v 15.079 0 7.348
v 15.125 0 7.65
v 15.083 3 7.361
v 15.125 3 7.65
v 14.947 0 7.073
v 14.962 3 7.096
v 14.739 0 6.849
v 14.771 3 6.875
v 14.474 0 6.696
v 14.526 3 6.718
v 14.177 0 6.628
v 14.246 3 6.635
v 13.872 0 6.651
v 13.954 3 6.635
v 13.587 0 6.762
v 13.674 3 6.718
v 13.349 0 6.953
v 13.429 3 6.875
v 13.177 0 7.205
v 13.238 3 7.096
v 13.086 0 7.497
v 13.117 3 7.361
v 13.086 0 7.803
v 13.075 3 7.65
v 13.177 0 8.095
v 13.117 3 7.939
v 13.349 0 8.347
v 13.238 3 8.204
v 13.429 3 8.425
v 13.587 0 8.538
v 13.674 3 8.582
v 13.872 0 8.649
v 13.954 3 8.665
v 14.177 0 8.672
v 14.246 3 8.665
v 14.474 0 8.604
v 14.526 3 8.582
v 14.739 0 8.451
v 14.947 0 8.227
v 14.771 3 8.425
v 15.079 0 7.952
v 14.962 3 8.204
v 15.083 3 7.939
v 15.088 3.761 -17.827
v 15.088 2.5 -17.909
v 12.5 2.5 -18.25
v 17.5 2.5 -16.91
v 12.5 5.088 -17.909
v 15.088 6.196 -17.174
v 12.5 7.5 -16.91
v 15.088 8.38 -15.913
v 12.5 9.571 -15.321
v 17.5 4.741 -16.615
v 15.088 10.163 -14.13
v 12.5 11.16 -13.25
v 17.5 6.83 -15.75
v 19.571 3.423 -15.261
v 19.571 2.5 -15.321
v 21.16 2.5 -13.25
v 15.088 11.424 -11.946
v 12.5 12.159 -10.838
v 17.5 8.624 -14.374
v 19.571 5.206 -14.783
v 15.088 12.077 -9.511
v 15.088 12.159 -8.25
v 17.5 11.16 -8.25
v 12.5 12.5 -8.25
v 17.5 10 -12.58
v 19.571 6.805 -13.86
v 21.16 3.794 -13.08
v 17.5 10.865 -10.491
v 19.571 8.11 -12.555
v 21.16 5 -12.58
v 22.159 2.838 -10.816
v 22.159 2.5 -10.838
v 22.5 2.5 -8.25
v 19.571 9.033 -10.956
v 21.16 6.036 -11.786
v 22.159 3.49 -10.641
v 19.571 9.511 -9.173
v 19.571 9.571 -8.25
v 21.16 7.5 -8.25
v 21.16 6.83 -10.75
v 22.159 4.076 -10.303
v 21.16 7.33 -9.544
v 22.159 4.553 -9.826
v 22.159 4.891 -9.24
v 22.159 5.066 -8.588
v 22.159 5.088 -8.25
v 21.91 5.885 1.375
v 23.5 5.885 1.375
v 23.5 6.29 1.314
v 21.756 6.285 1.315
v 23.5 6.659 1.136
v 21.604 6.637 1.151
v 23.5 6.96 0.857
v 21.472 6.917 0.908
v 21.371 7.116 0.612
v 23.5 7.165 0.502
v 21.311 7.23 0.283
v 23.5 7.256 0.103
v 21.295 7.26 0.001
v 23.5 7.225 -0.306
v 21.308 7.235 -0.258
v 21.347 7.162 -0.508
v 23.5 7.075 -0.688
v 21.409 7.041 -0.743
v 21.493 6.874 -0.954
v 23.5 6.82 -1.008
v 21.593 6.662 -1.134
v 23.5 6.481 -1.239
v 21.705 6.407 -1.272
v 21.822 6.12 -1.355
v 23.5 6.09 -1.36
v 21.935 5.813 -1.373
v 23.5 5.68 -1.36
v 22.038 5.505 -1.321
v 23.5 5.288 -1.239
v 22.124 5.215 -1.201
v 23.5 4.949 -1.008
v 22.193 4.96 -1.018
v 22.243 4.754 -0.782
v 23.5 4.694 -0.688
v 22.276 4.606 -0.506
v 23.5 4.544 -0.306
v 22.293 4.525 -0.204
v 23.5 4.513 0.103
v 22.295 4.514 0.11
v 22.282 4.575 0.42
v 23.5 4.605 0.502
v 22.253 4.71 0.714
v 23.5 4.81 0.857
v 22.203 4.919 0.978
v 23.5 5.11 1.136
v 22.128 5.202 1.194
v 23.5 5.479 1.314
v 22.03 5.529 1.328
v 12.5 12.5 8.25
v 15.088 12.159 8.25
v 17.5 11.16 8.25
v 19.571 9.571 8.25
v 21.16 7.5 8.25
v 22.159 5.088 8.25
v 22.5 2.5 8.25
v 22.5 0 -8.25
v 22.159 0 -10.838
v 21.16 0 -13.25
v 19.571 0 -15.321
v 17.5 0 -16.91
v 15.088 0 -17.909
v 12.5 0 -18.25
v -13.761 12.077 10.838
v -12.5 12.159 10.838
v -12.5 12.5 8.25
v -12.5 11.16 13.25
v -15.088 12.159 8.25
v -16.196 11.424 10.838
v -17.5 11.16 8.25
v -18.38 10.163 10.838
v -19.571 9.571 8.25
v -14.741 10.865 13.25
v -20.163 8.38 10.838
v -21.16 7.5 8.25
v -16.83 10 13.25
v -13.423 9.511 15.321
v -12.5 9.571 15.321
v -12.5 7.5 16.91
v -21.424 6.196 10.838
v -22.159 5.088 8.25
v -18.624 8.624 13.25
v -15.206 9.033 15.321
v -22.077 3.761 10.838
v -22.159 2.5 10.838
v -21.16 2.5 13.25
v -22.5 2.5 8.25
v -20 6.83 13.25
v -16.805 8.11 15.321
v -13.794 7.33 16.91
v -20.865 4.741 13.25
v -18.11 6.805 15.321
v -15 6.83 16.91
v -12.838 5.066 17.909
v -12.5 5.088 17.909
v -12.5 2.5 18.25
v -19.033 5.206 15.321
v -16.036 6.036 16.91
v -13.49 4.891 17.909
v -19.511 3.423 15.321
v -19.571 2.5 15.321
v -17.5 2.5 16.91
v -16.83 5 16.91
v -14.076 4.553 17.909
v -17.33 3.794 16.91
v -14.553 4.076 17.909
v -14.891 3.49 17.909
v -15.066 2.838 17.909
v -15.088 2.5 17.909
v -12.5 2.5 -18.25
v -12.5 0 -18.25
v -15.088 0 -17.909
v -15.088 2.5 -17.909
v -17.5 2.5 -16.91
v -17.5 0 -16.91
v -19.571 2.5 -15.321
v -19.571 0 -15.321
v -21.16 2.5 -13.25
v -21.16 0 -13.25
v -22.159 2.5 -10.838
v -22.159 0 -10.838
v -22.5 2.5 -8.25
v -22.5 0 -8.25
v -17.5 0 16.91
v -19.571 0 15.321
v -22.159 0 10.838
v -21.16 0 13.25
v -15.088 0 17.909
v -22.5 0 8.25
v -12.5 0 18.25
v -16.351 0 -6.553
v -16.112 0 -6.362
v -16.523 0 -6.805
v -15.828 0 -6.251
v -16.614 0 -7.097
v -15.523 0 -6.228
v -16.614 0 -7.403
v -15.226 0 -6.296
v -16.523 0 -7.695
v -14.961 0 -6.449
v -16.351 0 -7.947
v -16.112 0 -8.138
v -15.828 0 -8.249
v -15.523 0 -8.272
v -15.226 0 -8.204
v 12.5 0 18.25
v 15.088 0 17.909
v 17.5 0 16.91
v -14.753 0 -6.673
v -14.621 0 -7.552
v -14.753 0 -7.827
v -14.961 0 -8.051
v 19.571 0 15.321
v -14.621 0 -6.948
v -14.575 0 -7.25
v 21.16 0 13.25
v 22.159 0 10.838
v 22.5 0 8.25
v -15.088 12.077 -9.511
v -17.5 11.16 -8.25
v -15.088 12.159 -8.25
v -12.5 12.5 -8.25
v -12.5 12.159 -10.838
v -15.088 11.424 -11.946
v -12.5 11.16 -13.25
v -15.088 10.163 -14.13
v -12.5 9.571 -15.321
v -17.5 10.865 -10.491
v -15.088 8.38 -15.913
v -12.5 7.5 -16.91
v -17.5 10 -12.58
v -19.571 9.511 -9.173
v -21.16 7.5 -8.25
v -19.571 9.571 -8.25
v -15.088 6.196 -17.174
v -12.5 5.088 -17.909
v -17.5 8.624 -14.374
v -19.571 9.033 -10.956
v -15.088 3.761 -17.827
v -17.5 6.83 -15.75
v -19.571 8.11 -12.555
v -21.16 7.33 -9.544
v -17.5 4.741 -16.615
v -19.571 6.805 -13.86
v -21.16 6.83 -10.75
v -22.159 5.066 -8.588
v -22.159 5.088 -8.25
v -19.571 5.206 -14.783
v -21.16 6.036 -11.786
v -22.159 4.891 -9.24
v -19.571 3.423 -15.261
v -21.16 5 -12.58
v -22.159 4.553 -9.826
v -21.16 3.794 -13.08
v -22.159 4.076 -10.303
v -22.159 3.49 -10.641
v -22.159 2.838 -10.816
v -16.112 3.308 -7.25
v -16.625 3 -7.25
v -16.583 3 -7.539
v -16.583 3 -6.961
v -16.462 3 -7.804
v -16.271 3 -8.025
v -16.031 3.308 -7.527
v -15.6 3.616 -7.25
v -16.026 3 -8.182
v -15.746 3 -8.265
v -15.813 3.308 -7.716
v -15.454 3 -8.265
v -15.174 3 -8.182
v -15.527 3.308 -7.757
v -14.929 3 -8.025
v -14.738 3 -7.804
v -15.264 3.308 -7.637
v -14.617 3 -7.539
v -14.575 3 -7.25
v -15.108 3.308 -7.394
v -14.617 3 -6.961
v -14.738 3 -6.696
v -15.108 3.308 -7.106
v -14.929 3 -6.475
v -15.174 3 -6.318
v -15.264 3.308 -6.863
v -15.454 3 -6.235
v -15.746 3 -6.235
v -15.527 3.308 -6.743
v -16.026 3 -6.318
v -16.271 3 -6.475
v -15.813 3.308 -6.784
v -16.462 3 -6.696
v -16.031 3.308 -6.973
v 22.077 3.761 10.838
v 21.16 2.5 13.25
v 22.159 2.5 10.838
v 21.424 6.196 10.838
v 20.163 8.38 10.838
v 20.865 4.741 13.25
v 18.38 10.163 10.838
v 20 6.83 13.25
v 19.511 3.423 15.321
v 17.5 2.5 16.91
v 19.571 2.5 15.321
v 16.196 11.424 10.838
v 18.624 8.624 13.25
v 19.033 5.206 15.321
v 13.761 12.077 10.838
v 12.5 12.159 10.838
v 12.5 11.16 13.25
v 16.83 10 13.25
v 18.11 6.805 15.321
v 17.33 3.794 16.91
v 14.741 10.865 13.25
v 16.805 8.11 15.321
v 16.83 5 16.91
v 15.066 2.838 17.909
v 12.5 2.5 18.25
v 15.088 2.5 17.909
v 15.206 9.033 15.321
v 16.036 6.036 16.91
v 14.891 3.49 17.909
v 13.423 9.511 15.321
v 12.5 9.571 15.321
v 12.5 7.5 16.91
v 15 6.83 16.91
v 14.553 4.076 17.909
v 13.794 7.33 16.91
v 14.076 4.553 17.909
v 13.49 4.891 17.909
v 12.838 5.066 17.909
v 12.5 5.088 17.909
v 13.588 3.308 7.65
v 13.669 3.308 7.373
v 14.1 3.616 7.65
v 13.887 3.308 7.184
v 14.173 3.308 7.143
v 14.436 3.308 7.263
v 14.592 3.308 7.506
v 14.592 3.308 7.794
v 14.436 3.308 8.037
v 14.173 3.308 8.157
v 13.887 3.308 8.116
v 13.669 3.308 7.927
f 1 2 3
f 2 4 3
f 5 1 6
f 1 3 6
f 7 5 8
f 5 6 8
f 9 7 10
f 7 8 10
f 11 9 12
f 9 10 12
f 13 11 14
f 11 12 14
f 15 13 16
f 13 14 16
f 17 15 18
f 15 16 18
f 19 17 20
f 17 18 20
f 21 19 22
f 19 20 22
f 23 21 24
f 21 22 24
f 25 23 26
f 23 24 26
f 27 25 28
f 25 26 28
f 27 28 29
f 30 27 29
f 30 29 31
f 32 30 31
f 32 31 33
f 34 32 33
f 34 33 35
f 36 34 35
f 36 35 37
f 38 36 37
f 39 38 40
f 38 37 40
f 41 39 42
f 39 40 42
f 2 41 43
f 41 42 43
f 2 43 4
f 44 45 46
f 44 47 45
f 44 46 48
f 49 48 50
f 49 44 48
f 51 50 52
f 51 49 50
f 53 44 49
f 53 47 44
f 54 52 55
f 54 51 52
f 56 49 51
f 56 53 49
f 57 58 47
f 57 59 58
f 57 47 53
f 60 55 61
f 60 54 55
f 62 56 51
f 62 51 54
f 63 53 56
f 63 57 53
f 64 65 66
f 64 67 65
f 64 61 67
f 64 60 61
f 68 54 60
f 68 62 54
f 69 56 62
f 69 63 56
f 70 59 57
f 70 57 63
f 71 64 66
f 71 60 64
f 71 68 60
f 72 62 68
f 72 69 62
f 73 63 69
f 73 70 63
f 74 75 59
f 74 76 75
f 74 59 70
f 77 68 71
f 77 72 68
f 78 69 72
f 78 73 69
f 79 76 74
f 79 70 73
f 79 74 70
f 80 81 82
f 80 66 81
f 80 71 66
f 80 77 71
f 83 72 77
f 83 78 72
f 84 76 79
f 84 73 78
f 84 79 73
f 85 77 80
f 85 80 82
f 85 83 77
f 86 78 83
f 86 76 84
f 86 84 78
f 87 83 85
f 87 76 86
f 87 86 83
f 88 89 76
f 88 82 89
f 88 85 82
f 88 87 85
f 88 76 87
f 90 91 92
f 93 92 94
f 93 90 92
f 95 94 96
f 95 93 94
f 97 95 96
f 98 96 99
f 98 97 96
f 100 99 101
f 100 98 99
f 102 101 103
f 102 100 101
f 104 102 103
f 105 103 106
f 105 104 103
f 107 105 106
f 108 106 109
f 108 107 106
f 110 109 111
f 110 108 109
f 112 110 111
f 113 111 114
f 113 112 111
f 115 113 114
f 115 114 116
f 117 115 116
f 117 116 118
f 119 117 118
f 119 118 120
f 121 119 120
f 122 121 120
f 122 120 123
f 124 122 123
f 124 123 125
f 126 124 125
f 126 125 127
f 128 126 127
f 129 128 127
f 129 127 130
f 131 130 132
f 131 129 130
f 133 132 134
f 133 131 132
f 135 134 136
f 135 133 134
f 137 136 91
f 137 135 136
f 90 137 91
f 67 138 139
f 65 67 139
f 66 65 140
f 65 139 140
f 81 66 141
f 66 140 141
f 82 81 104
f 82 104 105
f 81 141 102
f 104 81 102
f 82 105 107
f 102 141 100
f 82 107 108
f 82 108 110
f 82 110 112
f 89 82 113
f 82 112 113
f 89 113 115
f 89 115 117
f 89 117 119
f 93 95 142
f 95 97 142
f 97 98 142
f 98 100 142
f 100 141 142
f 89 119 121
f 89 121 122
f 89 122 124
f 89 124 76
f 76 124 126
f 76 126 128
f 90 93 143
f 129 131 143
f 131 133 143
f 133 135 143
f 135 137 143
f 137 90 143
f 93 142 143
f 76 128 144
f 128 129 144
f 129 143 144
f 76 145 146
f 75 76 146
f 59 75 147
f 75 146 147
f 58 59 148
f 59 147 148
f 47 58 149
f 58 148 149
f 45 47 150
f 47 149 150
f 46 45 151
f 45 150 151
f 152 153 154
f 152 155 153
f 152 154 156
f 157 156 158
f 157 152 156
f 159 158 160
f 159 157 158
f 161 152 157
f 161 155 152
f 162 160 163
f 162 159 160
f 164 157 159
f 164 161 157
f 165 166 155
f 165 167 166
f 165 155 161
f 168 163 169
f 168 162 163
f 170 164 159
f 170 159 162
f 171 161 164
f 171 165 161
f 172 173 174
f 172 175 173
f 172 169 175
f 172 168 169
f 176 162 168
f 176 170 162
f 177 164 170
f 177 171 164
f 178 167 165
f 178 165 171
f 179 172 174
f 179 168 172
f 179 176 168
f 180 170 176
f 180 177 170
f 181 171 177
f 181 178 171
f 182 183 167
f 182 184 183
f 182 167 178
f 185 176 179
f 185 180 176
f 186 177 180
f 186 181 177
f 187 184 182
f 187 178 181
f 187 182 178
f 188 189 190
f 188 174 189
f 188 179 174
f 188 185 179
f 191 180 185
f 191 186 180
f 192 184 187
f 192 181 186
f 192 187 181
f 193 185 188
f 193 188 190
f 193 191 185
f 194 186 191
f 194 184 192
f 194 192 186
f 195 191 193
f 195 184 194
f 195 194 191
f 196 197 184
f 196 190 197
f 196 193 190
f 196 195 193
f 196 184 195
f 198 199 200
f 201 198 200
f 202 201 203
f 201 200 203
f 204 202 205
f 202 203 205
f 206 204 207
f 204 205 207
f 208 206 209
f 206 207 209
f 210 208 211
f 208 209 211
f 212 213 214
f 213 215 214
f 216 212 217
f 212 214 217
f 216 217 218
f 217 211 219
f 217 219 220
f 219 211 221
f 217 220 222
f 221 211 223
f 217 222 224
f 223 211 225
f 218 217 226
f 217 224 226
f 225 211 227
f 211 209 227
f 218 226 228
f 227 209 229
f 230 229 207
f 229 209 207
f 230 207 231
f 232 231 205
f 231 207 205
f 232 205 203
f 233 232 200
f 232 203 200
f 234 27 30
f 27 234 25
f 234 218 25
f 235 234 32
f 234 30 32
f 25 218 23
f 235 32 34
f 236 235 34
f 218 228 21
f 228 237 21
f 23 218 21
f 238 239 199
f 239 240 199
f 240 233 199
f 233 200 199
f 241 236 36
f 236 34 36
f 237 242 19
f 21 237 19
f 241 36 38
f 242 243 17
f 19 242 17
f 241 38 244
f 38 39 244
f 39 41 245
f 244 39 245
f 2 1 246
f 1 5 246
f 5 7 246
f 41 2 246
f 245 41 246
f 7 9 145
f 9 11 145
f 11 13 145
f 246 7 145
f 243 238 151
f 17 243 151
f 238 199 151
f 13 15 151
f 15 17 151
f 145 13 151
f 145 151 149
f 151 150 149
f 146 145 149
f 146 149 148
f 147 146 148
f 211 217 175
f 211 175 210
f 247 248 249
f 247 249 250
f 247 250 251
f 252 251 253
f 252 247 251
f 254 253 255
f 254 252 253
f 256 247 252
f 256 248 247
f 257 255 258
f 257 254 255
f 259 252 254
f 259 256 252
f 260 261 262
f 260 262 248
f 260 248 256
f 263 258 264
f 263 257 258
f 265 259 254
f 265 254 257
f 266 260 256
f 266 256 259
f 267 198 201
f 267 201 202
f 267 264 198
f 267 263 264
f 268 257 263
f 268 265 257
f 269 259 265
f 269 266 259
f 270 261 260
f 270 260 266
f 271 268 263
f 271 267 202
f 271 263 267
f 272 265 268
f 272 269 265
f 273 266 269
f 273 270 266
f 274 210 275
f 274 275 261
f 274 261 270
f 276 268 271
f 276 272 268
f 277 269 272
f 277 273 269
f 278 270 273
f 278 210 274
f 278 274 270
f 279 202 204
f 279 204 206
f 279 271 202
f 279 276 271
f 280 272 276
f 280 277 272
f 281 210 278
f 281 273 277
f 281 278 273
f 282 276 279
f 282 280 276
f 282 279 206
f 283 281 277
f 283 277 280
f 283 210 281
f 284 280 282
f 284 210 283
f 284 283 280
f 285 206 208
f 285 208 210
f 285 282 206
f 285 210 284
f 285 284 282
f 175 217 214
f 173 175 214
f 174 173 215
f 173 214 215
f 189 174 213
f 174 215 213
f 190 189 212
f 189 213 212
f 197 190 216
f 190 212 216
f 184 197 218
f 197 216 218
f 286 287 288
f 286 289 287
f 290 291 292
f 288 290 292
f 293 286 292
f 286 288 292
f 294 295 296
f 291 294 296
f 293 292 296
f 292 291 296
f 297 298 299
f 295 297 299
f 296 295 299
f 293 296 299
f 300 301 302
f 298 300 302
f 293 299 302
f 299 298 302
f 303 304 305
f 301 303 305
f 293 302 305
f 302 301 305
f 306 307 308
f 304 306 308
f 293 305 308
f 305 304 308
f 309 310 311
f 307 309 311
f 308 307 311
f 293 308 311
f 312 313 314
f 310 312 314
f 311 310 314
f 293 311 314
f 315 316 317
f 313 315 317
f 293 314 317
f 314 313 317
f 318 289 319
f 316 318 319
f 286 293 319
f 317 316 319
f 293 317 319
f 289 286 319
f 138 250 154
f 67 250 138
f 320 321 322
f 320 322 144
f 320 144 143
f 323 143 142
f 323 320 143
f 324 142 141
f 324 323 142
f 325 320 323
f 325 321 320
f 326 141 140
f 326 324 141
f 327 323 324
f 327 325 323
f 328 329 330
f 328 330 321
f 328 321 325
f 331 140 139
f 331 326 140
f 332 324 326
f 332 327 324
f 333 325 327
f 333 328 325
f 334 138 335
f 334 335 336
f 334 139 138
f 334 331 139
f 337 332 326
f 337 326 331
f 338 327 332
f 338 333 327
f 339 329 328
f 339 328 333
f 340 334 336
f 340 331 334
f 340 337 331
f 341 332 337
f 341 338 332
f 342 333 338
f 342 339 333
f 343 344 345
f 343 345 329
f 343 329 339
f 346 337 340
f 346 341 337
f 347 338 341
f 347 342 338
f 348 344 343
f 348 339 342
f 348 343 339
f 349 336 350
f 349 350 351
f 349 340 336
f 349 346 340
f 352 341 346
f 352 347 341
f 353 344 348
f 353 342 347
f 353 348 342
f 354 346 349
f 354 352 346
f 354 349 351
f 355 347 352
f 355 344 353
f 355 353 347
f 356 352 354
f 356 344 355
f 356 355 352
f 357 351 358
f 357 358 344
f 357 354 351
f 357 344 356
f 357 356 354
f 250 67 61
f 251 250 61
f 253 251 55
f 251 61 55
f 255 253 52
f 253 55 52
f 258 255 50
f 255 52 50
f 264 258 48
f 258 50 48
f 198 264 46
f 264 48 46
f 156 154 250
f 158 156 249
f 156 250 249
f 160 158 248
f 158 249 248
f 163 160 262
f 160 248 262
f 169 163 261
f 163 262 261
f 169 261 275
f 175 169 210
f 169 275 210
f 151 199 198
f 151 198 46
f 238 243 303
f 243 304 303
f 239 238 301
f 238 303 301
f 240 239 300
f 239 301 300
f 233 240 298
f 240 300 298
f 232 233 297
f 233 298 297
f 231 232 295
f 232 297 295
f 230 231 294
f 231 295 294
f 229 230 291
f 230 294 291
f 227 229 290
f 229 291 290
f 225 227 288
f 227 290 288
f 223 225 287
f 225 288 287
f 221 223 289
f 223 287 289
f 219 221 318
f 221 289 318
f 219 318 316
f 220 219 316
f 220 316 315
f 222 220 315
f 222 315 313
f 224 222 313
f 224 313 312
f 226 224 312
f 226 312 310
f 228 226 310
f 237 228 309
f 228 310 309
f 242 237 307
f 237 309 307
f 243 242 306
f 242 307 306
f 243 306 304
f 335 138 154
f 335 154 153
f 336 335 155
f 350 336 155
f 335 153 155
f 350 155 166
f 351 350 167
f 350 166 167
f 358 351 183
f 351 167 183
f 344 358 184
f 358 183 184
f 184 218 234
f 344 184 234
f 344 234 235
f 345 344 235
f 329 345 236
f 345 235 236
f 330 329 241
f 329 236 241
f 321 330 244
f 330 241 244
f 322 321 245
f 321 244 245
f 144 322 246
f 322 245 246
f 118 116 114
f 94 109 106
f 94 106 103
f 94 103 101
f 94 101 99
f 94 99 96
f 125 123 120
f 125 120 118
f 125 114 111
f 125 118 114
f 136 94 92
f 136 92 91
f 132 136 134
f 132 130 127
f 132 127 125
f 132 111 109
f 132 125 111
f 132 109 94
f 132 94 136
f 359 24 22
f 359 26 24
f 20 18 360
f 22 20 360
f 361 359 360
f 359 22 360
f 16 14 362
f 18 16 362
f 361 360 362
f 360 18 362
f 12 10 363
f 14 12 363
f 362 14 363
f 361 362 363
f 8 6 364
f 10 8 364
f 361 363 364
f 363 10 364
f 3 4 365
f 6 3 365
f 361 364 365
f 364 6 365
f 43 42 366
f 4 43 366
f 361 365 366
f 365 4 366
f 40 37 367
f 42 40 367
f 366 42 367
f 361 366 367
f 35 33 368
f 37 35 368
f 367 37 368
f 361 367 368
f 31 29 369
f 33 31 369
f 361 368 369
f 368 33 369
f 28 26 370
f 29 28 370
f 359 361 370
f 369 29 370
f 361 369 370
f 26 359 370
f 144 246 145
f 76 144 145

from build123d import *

# Parameters (mm, degrees)
SKETCH1_W                          = 45
SKETCH1_H                          = 36.5
BOSS_EXTRUDE1_DEPTH                = 12.5
SKETCH2_R                          = 1.375
BOSS_EXTRUDE2_DEPTH                = 1
TAP_DRILL_FOR_M2_5X0_45_TAP1_D     = 2.05
TAP_DRILL_FOR_M2_5X0_45_TAP1_DEPTH = 3
TAP_DRILL_FOR_M2_5X0_45_TAP1_TIP   = 0.615882135
FILLET1_R                          = 10


with BuildPart() as part:
    # Sketch1 → Boss-Extrude1 (new body)
    with BuildSketch(Plane(origin=(0, 0, 0), x_dir=(1, 0, 0), z_dir=(0, 1, 0))):
        Rectangle(SKETCH1_W, SKETCH1_H)
    extrude(amount=BOSS_EXTRUDE1_DEPTH)

    # Sketch2 → Boss-Extrude2 (add)
    with BuildSketch(Plane(origin=(22.5, 0, 0), x_dir=(0, 0, -1), z_dir=(1, 0, 0))):
        with Locations(Location((0, 5.884601179, 0), (0, 0, 180))):
            Circle(SKETCH2_R)
    extrude(amount=BOSS_EXTRUDE2_DEPTH)

    # Tap Drill for M2.5x0.45 Tap1
    with Locations(Plane(origin=(0, 0, 0), x_dir=(-1, 0, 0), z_dir=(0, -1, 0))):
        with Locations((15.6, 7.25), (-14.1, -7.65)):
            Hole(TAP_DRILL_FOR_M2_5X0_45_TAP1_D / 2, depth=TAP_DRILL_FOR_M2_5X0_45_TAP1_DEPTH)
            with Locations((0, 0, -(TAP_DRILL_FOR_M2_5X0_45_TAP1_DEPTH + TAP_DRILL_FOR_M2_5X0_45_TAP1_TIP / 2))):  # 118° drill point
                Cone(0, TAP_DRILL_FOR_M2_5X0_45_TAP1_D / 2, TAP_DRILL_FOR_M2_5X0_45_TAP1_TIP, mode=Mode.SUBTRACT)

    # Fillet1
    # the kernel refuses this fillet: 10 mm, written as the material it takes off along each edge
    with BuildSketch(Plane(origin=(12.5, 2.5, 8.25), x_dir=(1, 0, 0), z_dir=(0, 0, 1))) as fillet1_piece_1_section:
        Polygon((0, 0), (FILLET1_R, 0), (FILLET1_R, FILLET1_R), (0, FILLET1_R), align=None)
    fillet1_piece_1 = extrude(amount=FILLET1_R, mode=Mode.PRIVATE)
    fillet1_piece_1 = fillet1_piece_1 - Plane(origin=(12.5, 2.5, 8.25), x_dir=(-0.7071067811865475, -0.7071067811865475, 0), z_dir=(0, 0, 1)) * Sphere(FILLET1_R, mode=Mode.PRIVATE)
    add(fillet1_piece_1, mode=Mode.SUBTRACT)
    with BuildSketch(Plane(origin=(12.5, 2.5, -8.25), x_dir=(0, 1, 0), z_dir=(1, 0, 0))) as fillet1_piece_2_section:
        Polygon((0, 0), (FILLET1_R, 0), (FILLET1_R, -FILLET1_R), (0, -FILLET1_R), align=None)
    fillet1_piece_2 = extrude(amount=FILLET1_R, mode=Mode.PRIVATE)
    fillet1_piece_2 = fillet1_piece_2 - Plane(origin=(12.5, 2.5, -8.25), x_dir=(0, -0.7071067811865475, 0.7071067811865475), z_dir=(1, 0, 0)) * Sphere(FILLET1_R, mode=Mode.PRIVATE)
    add(fillet1_piece_2, mode=Mode.SUBTRACT)
    with BuildSketch(Plane(origin=(-12.5, 2.5, 8.25), x_dir=(-1, 0, 0), z_dir=(0, 0, 1))) as fillet1_piece_3_section:
        Polygon((0, 0), (FILLET1_R, 0), (FILLET1_R, -FILLET1_R), (0, -FILLET1_R), align=None)
    fillet1_piece_3 = extrude(amount=FILLET1_R, mode=Mode.PRIVATE)
    fillet1_piece_3 = fillet1_piece_3 - Plane(origin=(-12.5, 2.5, 8.25), x_dir=(0.7071067811865475, -0.7071067811865475, 0), z_dir=(0, 0, 1)) * Sphere(FILLET1_R, mode=Mode.PRIVATE)
    add(fillet1_piece_3, mode=Mode.SUBTRACT)
    with BuildSketch(Plane(origin=(-12.5, 2.5, -8.25), x_dir=(0, 1, 0), z_dir=(-1, 0, 0))) as fillet1_piece_4_section:
        Polygon((0, 0), (FILLET1_R, 0), (FILLET1_R, FILLET1_R), (0, FILLET1_R), align=None)
    fillet1_piece_4 = extrude(amount=FILLET1_R, mode=Mode.PRIVATE)
    fillet1_piece_4 = fillet1_piece_4 - Plane(origin=(-12.5, 2.5, -8.25), x_dir=(0, -0.7071067811865475, 0.7071067811865475), z_dir=(-1, 0, 0)) * Sphere(FILLET1_R, mode=Mode.PRIVATE)
    add(fillet1_piece_4, mode=Mode.SUBTRACT)
    with BuildSketch(Plane(origin=(22.5, 12.5, 8.25), x_dir=(0, -1, 0), z_dir=(0, 0, -1))) as fillet1_piece_5_section:
        with BuildLine():
            CenterArc((FILLET1_R, FILLET1_R), FILLET1_R, 180, 90)
            Line((0, FILLET1_R), (0, 0))
            Line((0, 0), (FILLET1_R, 0))
        make_face()
    fillet1_piece_5 = extrude(amount=16.5, mode=Mode.PRIVATE)
    fillet1_piece_5 = fillet1_piece_5 - Plane(origin=(20.212473713, 5.884601179, 0), x_dir=(0, 0, 1), z_dir=(-1, 0, 0)) * Cylinder(1.375, 73, mode=Mode.PRIVATE)
    add(fillet1_piece_5, mode=Mode.SUBTRACT)
    with BuildSketch(Plane(origin=(-12.5, 12.5, 18.25), x_dir=(0, -1, 0), z_dir=(1, 0, 0))) as fillet1_piece_6:
        with BuildLine():
            CenterArc((FILLET1_R, FILLET1_R), FILLET1_R, 180, 90)
            Line((0, FILLET1_R), (0, 0))
            Line((0, 0), (FILLET1_R, 0))
        make_face()
    extrude(amount=25, mode=Mode.SUBTRACT)
    with BuildSketch(Plane(origin=(-22.5, 12.5, -8.25), x_dir=(0, -1, 0), z_dir=(0, 0, 1))) as fillet1_piece_7:
        with BuildLine():
            CenterArc((FILLET1_R, FILLET1_R), FILLET1_R, 180, 90)
            Line((0, FILLET1_R), (0, 0))
            Line((0, 0), (FILLET1_R, 0))
        make_face()
    extrude(amount=16.5, mode=Mode.SUBTRACT)
    with BuildSketch(Plane(origin=(12.5, 12.5, -18.25), x_dir=(0, 0, 1), z_dir=(-1, 0, 0))) as fillet1_piece_8:
        with BuildLine():
            CenterArc((FILLET1_R, -FILLET1_R), FILLET1_R, 90, 90)
            Line((0, -FILLET1_R), (0, 0))
            Line((0, 0), (FILLET1_R, 0))
        make_face()
    extrude(amount=25, mode=Mode.SUBTRACT)
    with BuildSketch(Plane(origin=(-22.5, -25, 18.25), x_dir=(1, 0, 0), z_dir=(0, 1, 0)), Plane(origin=(-22.5, -25, -18.25), x_dir=(0, 0, 1), z_dir=(0, 1, 0))) as fillet1_piece_9:
        with BuildLine():
            CenterArc((FILLET1_R, FILLET1_R), FILLET1_R, 180, 90)
            Line((0, FILLET1_R), (0, 0))
            Line((0, 0), (FILLET1_R, 0))
        make_face()
    extrude(amount=27.5, mode=Mode.SUBTRACT)
    with BuildSketch(Plane(origin=(22.5, -25, 18.25), x_dir=(-1, 0, 0), z_dir=(0, 1, 0)), Plane(origin=(22.5, -25, -18.25), x_dir=(0, 0, 1), z_dir=(0, 1, 0))) as fillet1_piece_10:
        with BuildLine():
            CenterArc((FILLET1_R, -FILLET1_R), FILLET1_R, 90, 90)
            Line((0, -FILLET1_R), (0, 0))
            Line((0, 0), (FILLET1_R, 0))
        make_face()
    extrude(amount=27.5, mode=Mode.SUBTRACT)


solid = part.part
